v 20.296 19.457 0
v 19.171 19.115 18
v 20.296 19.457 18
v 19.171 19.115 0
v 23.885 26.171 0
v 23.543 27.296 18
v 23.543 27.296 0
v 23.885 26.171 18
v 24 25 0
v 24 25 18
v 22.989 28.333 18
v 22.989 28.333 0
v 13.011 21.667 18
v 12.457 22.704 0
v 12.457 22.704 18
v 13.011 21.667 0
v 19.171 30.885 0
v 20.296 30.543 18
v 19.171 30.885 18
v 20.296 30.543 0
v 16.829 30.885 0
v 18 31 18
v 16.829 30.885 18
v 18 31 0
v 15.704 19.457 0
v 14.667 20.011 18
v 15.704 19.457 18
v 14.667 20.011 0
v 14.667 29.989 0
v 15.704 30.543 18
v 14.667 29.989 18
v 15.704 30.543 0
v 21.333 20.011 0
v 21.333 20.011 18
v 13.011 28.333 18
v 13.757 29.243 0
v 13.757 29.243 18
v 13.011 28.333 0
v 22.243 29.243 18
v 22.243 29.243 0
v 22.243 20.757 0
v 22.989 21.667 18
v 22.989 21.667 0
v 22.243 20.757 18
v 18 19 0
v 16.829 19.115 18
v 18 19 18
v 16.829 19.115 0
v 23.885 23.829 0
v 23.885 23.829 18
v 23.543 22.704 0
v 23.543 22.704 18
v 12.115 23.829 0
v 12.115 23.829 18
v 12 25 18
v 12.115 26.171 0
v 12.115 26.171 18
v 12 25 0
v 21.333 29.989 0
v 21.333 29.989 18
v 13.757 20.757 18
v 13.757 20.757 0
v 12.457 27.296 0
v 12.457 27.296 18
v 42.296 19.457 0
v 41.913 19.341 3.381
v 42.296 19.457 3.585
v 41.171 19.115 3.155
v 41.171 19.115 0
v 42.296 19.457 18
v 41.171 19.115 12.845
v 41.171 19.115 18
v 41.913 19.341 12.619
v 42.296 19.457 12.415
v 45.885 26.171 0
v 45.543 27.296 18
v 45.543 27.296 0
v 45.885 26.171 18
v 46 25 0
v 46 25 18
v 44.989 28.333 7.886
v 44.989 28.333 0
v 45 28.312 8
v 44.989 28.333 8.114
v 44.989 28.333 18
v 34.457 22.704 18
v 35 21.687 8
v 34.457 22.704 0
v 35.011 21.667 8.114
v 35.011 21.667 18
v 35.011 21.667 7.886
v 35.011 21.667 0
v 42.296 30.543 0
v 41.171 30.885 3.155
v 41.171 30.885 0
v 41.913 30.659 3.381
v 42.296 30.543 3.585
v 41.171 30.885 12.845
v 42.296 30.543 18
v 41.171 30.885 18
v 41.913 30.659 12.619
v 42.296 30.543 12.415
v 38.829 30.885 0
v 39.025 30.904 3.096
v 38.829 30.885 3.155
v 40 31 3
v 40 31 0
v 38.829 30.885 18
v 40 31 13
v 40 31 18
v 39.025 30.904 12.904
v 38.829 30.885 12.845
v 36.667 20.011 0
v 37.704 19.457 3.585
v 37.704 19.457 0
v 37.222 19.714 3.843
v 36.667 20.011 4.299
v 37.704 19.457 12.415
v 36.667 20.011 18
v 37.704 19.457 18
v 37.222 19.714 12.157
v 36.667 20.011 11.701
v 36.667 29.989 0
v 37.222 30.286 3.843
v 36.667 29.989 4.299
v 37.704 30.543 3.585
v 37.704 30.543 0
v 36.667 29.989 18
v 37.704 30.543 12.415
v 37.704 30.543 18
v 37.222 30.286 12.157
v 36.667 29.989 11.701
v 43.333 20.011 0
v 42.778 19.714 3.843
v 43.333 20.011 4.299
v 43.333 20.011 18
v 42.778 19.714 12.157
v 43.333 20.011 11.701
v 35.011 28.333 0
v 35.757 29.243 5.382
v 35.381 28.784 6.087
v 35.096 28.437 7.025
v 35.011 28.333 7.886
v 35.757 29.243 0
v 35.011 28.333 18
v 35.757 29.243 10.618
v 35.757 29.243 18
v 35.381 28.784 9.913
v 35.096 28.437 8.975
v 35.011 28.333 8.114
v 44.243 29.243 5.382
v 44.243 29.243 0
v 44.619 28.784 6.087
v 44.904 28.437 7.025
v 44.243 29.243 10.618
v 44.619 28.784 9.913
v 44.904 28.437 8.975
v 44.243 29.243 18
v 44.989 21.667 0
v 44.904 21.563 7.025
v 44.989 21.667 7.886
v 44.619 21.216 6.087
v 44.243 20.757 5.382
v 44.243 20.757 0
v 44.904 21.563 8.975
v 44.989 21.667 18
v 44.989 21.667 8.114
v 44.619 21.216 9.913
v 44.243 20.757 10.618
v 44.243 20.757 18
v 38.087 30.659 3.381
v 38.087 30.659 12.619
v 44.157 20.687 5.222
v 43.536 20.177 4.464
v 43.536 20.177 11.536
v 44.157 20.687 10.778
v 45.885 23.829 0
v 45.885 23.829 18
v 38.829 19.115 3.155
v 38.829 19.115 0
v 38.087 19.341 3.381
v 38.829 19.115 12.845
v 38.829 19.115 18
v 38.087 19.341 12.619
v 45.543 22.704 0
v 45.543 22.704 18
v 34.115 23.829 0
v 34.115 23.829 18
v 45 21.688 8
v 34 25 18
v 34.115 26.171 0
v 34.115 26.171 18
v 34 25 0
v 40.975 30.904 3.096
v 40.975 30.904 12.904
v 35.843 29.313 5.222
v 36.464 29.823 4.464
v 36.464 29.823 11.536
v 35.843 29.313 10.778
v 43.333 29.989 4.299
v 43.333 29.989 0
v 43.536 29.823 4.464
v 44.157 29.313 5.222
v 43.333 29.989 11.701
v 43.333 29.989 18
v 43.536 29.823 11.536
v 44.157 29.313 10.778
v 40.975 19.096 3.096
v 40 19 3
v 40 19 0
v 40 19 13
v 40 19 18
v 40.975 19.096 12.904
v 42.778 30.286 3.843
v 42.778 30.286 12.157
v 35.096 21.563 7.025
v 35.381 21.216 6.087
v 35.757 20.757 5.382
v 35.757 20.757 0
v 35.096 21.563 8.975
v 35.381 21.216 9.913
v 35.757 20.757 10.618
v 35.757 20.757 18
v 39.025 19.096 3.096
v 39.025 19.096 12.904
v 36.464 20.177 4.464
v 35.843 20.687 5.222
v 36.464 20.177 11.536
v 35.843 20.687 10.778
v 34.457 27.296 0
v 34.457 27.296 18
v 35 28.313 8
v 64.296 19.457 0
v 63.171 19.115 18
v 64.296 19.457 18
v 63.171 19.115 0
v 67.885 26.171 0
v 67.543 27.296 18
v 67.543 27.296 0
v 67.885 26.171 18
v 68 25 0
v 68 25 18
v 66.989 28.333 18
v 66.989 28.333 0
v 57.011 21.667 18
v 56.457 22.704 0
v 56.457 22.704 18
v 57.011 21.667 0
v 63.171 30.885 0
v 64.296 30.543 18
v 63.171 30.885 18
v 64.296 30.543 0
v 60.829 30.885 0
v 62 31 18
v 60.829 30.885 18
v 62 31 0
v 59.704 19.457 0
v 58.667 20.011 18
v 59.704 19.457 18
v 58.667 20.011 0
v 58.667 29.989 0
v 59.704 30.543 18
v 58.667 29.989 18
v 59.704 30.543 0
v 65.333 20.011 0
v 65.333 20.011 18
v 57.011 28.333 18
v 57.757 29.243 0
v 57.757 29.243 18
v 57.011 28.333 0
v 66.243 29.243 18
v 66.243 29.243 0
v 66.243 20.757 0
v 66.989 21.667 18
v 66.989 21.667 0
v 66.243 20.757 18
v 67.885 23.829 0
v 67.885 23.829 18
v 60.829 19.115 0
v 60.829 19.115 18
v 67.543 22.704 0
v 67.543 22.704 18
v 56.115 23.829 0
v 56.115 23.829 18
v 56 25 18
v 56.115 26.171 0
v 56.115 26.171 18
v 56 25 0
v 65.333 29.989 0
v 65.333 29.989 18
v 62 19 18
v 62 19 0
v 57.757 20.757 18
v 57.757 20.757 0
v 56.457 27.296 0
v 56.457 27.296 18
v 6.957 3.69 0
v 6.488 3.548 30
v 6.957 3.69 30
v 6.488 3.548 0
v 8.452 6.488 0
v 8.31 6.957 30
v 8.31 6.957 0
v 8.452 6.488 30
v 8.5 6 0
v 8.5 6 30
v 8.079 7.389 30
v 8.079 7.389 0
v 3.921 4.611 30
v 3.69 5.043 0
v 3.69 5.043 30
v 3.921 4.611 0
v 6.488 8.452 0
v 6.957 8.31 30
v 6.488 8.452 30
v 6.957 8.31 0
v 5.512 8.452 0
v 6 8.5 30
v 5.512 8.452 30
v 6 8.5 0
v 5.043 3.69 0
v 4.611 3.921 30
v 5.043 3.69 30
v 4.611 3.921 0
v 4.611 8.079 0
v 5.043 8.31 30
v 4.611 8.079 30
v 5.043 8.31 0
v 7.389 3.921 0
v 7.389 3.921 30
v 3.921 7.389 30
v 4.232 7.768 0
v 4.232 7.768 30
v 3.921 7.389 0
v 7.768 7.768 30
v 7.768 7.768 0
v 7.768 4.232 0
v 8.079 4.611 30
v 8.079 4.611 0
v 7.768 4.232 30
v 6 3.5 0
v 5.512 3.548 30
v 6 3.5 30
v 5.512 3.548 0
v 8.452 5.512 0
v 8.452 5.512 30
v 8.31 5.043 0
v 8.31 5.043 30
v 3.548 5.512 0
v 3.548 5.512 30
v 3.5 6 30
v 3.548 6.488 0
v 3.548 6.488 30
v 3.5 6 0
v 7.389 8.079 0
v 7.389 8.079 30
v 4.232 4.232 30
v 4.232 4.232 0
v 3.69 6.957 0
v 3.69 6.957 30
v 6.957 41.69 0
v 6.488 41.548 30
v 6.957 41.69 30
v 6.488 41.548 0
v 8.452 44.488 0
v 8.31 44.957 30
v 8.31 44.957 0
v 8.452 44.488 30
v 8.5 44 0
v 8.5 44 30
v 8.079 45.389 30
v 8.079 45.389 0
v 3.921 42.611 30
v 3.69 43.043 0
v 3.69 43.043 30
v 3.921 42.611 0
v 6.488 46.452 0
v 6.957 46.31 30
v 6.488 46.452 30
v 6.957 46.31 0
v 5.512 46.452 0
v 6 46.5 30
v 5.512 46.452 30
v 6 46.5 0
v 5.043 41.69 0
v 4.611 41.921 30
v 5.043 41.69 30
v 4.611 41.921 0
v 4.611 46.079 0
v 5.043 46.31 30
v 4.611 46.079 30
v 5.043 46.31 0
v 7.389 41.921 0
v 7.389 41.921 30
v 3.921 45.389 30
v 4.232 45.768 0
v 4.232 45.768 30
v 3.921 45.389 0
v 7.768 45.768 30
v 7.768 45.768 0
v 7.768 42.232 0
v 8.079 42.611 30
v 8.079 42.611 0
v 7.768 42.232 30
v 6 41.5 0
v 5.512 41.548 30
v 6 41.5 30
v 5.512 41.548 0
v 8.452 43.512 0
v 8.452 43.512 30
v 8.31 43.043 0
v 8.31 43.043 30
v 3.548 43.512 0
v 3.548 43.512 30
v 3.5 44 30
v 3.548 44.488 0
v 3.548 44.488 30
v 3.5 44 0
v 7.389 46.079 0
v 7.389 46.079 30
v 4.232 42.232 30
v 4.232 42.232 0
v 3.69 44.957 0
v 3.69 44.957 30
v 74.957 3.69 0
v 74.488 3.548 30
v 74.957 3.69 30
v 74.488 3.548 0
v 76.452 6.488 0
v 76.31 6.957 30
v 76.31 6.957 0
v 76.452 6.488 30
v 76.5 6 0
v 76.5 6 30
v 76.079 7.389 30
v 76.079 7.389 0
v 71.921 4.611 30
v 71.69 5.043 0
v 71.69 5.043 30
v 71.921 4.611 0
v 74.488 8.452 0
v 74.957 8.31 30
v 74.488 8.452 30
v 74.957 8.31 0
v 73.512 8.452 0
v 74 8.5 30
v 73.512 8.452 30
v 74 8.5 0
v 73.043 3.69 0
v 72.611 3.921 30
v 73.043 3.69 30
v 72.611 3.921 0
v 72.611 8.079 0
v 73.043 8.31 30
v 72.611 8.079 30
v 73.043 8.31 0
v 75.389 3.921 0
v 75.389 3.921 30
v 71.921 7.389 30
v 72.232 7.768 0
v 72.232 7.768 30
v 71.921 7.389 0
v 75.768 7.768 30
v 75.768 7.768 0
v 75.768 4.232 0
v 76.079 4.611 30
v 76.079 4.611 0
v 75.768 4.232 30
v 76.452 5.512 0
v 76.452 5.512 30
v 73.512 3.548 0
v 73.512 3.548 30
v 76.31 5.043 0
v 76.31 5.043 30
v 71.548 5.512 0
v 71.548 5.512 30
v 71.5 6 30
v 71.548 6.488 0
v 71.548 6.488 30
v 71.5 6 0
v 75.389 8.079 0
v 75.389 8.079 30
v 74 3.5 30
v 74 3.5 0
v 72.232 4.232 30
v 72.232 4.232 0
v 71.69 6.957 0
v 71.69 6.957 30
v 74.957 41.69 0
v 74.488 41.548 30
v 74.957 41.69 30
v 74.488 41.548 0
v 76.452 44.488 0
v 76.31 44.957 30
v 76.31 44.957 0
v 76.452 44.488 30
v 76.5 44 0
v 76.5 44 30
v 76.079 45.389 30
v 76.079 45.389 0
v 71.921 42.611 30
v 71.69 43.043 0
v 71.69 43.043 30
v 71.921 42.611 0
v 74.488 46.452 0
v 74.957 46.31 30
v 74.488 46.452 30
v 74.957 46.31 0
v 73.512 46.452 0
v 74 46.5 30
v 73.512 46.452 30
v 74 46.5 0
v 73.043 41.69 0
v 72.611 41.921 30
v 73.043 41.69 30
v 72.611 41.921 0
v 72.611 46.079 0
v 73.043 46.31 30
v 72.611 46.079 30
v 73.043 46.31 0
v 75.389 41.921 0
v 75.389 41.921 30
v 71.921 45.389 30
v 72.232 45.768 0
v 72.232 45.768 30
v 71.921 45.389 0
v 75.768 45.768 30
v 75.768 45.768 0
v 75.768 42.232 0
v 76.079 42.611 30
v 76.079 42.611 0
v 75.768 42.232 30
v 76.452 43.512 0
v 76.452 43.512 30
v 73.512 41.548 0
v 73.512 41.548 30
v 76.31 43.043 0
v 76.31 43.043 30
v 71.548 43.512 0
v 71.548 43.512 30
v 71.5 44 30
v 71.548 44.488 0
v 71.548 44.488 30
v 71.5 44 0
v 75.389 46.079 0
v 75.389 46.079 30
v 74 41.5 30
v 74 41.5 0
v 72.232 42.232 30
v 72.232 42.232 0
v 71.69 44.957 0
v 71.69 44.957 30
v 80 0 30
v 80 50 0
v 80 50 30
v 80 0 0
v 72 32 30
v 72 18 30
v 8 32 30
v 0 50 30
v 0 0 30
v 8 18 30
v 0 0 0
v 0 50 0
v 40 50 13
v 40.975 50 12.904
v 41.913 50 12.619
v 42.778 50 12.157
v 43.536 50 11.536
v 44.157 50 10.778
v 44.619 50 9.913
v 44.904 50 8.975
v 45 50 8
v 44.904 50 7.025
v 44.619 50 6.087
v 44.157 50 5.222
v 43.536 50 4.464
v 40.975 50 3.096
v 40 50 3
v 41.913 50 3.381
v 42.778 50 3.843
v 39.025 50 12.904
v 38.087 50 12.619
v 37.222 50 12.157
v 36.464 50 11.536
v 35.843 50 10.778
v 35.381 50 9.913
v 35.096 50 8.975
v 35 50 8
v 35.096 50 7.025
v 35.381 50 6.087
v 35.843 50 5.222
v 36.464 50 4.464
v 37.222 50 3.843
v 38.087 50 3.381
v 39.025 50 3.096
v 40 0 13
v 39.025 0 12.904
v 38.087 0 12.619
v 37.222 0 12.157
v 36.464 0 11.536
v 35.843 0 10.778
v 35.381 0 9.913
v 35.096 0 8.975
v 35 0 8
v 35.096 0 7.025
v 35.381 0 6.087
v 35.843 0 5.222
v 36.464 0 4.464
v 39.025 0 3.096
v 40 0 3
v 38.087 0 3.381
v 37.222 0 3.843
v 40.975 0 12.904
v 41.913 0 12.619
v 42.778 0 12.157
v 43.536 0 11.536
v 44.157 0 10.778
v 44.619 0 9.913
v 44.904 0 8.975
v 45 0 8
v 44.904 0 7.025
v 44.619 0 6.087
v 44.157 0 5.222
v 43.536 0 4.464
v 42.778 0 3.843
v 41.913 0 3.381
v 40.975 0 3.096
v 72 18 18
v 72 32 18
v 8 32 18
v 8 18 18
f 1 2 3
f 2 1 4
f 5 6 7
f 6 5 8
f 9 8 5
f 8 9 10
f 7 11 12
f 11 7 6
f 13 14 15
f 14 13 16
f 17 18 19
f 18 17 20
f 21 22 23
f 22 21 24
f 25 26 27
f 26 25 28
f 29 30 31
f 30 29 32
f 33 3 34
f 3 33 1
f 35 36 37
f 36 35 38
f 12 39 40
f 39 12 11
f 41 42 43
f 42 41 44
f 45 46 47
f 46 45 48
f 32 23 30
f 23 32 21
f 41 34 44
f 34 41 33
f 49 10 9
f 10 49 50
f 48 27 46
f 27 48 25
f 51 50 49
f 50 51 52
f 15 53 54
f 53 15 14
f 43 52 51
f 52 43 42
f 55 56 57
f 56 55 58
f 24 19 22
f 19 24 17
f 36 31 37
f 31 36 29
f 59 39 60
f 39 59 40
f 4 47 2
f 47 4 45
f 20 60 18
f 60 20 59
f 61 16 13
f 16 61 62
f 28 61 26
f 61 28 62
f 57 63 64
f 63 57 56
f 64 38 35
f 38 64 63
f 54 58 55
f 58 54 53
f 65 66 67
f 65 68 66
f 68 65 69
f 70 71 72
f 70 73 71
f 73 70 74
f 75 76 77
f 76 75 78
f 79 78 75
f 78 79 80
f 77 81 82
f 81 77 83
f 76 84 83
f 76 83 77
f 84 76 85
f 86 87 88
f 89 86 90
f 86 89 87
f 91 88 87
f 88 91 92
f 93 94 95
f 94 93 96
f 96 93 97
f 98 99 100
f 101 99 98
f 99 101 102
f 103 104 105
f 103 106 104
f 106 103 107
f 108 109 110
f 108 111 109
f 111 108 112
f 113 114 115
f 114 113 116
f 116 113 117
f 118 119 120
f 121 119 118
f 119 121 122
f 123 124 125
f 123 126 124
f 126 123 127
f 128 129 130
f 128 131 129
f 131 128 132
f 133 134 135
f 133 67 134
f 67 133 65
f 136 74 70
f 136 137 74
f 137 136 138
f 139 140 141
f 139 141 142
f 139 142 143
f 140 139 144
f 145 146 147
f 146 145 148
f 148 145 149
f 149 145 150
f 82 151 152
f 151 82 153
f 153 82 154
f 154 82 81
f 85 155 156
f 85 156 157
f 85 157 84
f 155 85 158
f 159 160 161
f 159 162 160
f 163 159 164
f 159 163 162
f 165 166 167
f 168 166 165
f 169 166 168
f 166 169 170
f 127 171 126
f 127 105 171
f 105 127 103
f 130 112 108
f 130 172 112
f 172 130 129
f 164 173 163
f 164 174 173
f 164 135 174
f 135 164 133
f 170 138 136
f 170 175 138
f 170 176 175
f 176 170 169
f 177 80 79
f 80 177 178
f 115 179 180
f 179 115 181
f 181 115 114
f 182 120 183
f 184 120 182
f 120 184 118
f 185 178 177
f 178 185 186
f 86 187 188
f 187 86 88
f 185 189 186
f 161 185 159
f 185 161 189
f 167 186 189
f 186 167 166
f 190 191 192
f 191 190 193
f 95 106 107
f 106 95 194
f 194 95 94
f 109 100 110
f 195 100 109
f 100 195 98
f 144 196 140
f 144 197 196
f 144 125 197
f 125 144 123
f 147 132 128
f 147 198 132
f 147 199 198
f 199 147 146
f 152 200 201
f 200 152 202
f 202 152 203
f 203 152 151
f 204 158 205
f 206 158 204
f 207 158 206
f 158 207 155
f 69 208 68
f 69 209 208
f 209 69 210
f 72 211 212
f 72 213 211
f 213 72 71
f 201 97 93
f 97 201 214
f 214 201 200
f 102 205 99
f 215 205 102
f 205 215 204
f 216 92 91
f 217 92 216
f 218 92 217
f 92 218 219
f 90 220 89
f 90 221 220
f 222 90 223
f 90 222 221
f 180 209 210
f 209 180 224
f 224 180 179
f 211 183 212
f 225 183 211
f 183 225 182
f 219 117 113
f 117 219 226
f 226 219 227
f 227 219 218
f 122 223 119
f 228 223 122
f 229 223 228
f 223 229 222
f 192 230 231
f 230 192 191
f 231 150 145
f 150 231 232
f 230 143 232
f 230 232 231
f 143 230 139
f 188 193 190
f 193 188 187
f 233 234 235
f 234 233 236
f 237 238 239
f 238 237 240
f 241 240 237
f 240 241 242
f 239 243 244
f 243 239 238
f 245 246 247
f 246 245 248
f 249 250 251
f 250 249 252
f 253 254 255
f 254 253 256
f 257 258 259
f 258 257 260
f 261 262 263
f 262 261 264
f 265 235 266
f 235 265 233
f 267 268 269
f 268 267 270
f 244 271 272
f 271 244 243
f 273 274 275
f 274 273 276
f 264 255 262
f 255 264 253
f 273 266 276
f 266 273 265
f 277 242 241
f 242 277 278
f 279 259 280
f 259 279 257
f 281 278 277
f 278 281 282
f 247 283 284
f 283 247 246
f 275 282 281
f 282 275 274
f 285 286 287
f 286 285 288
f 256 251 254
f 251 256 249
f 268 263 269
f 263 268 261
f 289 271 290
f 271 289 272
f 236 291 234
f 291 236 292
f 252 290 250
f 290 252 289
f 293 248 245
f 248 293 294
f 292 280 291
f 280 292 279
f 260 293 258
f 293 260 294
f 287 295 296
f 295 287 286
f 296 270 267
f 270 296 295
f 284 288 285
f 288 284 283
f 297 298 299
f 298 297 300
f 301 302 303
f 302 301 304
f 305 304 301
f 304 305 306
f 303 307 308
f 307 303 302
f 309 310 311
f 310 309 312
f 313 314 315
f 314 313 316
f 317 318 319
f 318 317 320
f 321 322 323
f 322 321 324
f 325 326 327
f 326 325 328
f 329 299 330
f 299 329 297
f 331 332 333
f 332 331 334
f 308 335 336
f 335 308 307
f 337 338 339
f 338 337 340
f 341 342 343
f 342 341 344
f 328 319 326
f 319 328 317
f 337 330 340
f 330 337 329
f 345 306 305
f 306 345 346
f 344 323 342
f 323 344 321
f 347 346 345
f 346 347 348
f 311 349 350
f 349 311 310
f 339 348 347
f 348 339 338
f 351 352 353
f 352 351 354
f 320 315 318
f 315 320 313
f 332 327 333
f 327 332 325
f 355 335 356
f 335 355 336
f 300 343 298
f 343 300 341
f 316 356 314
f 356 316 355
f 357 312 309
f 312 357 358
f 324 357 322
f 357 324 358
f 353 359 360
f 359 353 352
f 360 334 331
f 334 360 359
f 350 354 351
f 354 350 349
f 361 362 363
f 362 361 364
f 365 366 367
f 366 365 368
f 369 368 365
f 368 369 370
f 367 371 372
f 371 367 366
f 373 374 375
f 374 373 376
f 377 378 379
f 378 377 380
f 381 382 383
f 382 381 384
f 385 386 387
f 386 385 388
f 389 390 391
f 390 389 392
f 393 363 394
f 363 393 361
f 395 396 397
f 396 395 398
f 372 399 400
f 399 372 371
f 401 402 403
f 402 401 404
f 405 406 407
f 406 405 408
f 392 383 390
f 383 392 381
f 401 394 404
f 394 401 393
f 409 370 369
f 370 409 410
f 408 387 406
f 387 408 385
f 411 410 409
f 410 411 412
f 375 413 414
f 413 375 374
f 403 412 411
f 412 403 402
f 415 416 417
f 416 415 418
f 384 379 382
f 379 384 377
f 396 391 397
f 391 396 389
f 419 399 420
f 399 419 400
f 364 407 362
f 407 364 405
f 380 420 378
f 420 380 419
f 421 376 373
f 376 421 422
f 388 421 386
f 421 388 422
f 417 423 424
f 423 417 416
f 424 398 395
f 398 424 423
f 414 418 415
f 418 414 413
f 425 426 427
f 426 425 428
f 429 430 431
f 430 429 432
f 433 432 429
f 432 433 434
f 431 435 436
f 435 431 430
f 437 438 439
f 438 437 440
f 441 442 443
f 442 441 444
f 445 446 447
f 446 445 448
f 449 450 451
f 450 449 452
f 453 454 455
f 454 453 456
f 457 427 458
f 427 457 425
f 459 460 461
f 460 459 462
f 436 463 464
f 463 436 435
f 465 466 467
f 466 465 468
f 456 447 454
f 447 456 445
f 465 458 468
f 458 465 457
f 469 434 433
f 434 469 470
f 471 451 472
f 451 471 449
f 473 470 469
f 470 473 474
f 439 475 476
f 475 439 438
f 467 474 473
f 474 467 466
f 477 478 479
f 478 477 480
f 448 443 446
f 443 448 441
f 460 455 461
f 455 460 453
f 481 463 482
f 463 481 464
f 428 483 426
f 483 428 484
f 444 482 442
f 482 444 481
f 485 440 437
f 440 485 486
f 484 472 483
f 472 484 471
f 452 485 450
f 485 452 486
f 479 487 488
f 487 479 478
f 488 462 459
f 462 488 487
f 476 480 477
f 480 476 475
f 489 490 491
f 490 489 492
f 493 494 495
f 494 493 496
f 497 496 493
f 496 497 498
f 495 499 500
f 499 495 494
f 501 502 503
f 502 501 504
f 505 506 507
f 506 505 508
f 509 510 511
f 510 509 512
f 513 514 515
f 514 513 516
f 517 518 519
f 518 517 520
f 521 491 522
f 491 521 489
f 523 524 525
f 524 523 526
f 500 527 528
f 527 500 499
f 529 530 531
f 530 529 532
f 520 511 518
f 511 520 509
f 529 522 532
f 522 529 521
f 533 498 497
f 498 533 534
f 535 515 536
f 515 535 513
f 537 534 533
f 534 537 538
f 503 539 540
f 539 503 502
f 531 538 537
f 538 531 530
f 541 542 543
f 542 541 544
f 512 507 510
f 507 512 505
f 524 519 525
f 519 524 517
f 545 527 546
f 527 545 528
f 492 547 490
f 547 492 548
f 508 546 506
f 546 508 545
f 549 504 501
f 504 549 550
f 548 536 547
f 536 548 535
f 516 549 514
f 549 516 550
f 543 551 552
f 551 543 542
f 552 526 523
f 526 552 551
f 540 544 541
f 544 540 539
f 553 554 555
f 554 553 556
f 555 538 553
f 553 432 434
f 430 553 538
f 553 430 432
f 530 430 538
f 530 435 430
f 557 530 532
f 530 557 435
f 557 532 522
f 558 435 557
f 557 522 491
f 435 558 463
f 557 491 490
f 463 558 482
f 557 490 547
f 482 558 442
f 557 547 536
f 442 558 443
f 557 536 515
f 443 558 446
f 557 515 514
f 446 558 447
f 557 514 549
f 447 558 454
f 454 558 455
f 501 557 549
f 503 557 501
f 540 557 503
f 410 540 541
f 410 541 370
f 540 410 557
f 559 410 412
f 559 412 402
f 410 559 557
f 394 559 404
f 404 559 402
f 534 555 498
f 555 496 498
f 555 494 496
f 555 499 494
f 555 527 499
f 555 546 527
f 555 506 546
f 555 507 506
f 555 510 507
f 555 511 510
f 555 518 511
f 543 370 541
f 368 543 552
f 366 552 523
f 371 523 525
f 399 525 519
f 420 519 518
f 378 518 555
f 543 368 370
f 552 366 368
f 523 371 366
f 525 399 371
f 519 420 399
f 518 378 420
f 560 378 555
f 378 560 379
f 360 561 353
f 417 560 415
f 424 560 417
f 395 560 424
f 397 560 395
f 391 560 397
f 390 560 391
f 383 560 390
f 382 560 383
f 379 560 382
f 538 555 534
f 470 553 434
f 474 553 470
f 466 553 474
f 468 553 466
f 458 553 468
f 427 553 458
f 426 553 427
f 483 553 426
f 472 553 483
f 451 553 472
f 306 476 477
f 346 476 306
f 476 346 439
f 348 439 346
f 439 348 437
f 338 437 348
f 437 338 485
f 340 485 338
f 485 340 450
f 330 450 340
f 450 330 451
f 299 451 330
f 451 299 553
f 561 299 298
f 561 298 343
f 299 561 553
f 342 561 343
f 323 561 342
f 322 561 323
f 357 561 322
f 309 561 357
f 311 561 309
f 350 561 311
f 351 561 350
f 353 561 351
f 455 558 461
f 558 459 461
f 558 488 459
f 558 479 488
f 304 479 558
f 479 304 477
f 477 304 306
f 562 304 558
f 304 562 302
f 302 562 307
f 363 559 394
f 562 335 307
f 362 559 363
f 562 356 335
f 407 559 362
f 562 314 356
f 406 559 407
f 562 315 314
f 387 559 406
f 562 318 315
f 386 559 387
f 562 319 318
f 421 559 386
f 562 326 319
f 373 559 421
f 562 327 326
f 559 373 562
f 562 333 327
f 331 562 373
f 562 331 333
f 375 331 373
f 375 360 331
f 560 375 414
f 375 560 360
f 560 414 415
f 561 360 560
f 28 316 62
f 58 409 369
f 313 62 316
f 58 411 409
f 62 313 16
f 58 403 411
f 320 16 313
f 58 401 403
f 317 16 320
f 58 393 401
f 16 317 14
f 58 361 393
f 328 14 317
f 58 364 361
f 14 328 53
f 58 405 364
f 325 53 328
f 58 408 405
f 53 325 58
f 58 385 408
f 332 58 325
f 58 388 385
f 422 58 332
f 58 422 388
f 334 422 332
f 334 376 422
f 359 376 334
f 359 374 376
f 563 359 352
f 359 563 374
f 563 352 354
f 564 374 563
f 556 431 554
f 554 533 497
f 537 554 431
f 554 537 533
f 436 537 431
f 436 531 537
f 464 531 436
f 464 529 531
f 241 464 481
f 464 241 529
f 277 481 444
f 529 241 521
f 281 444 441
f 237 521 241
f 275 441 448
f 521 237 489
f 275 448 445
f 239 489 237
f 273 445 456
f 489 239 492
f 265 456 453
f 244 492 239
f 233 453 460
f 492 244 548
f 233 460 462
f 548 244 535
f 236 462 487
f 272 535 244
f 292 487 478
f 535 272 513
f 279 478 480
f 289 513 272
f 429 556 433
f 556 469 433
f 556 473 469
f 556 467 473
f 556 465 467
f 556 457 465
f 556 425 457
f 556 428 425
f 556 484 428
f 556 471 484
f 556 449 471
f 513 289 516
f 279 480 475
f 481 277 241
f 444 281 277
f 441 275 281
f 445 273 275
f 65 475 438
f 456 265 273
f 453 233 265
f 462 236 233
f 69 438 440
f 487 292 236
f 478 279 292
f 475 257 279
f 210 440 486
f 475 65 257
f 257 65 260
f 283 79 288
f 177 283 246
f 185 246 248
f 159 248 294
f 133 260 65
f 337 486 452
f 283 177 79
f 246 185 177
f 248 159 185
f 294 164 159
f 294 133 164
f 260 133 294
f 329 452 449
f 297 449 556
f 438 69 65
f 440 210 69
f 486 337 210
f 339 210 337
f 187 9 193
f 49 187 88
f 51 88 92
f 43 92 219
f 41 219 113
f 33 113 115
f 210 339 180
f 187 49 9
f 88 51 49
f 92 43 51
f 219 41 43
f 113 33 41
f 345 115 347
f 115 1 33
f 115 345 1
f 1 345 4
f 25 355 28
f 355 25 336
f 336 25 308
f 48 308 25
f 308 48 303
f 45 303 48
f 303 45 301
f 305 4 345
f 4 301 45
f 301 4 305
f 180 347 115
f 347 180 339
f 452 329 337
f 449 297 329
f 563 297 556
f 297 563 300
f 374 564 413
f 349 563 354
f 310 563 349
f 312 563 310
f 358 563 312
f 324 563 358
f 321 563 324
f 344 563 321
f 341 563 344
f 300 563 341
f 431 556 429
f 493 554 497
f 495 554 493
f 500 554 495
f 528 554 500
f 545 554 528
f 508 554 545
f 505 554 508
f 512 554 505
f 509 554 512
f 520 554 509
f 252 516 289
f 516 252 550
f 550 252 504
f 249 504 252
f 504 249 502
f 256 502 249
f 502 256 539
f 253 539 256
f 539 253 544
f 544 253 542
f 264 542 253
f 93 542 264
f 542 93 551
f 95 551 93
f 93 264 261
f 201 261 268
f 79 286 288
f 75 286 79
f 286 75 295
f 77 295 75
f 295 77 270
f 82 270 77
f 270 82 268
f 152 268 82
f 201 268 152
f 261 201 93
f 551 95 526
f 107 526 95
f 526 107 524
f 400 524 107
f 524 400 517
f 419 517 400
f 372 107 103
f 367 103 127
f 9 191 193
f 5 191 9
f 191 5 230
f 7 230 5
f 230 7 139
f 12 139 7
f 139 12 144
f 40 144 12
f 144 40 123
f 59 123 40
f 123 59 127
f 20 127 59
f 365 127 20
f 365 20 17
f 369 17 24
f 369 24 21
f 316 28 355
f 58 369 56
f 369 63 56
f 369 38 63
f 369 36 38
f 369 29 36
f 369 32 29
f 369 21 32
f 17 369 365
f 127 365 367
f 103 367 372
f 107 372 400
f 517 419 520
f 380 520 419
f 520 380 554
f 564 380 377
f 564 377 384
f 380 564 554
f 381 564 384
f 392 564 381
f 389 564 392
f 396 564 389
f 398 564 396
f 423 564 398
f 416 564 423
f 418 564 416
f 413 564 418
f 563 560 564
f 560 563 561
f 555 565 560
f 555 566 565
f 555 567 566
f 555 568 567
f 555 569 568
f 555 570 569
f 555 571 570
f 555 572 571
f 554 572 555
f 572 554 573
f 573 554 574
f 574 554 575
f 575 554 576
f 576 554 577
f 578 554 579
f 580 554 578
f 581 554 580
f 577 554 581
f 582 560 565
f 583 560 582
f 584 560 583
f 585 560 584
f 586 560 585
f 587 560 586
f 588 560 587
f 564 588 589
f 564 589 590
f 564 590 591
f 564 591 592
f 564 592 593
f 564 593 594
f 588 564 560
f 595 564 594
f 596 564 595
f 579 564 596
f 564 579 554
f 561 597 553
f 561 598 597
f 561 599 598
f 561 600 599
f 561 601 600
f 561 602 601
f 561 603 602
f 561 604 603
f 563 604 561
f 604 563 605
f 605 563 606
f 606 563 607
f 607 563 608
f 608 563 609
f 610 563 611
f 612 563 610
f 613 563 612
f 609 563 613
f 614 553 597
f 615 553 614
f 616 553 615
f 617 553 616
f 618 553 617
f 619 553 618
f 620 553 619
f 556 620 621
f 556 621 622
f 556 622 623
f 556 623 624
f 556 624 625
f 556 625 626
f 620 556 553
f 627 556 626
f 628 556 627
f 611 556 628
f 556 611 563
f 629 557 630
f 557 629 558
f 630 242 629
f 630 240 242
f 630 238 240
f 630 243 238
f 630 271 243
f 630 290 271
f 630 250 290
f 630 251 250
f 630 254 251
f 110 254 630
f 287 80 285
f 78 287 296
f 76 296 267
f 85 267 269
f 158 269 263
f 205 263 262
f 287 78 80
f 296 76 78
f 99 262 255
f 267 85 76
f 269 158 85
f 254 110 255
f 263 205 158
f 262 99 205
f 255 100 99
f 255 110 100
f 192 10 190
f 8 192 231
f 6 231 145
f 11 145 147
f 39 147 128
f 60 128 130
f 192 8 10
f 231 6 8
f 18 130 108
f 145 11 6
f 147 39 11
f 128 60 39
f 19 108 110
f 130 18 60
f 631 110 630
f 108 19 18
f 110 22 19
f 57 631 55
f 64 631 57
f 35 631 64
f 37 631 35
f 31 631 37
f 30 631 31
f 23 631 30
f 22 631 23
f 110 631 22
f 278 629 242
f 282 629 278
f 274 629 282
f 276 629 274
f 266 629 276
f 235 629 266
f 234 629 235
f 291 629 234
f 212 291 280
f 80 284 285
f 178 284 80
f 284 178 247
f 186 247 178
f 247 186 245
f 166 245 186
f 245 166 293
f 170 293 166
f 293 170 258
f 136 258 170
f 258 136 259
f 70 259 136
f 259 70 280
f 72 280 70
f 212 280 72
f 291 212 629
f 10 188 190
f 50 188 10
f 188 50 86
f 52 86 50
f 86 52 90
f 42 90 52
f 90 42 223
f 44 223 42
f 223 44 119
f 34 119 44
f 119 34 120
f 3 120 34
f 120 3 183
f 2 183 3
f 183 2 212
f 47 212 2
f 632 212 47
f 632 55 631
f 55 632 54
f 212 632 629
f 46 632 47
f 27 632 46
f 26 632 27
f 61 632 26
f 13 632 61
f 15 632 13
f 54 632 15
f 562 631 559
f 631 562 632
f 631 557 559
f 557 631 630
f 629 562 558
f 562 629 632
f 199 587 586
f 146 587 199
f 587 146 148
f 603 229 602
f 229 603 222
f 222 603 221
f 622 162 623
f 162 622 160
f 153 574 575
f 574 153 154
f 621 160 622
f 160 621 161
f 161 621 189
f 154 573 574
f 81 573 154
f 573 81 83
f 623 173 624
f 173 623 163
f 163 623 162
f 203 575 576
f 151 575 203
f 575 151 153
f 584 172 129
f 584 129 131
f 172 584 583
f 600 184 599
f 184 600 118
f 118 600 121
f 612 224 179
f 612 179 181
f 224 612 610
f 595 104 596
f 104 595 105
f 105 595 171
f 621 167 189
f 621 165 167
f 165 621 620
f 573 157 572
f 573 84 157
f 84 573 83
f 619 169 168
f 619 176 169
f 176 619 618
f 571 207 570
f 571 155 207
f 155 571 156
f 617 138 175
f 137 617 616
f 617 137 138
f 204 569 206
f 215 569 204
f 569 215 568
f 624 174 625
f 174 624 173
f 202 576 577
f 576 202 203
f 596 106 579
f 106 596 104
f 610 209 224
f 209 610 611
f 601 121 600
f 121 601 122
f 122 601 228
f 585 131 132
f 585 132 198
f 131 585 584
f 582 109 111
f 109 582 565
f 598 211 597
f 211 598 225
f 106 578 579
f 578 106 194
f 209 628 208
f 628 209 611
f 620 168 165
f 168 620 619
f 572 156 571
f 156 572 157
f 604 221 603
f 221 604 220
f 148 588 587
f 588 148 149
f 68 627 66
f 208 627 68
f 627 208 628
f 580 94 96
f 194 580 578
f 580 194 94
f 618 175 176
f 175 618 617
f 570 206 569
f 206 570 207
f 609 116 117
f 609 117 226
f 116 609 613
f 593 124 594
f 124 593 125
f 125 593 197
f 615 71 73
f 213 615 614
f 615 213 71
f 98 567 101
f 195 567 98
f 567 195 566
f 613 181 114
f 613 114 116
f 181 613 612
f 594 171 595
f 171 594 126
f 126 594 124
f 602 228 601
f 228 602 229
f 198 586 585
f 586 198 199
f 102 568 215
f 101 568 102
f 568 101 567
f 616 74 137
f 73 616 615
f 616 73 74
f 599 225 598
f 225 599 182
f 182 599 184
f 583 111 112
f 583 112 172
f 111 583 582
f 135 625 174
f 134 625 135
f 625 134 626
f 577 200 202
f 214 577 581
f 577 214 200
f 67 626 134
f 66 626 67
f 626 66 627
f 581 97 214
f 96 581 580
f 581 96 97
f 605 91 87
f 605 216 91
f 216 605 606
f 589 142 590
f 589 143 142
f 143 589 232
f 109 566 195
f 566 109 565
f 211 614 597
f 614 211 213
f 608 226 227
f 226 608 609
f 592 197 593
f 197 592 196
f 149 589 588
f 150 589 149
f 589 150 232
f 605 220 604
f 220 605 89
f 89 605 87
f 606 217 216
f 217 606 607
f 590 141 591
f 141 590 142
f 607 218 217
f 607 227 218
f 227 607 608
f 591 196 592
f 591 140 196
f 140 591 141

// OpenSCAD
$fn = 32;

// ----------------------------------------------------------------------
// Manifold block: side_outlet manifold
// ----------------------------------------------------------------------

// --- parameters (mm) ---
block_l = 80;             // block length, X
block_w = 50;             // block width, Y
block_h = 30;             // block height, Z
port_d = 12;              // port bore diameter
port_pitch = 22;          // port pitch along X
gallery_d = 14;           // top gallery width, Y
gallery_depth = 12;       // gallery pocket depth
wall_p = 8;               // gallery end wall thickness, X
mnt_d = 5;                // mounting hole diameter
mnt_in = 6;               // mounting hole inset from the edges
out_d = 10;               // outlet bore diameter
out_z = 8;                // outlet axis height

n_ports = 3;  // ports in the row
port_x0 = (block_l - (n_ports - 1) * port_pitch) / 2;  // first port X

difference() {
  cube([block_l, block_w, block_h]);
  for (i = [0 : n_ports - 1])
    translate([port_x0 + i * port_pitch, block_w / 2, -1])
      cylinder(h = block_h + 2, d = port_d);
  translate([wall_p, block_w / 2 - gallery_d / 2, block_h - gallery_depth])
    cube([block_l - 2 * wall_p, gallery_d, gallery_depth + 1]);
  for (cx = [mnt_in, block_l - mnt_in])
    for (cy = [mnt_in, block_w - mnt_in])
      translate([cx, cy, -1]) cylinder(h = block_h + 2, d = mnt_d);
  translate([block_l / 2, -1, out_z]) rotate([-90, 0, 0])
    cylinder(h = block_w + 2, d = out_d);
}
